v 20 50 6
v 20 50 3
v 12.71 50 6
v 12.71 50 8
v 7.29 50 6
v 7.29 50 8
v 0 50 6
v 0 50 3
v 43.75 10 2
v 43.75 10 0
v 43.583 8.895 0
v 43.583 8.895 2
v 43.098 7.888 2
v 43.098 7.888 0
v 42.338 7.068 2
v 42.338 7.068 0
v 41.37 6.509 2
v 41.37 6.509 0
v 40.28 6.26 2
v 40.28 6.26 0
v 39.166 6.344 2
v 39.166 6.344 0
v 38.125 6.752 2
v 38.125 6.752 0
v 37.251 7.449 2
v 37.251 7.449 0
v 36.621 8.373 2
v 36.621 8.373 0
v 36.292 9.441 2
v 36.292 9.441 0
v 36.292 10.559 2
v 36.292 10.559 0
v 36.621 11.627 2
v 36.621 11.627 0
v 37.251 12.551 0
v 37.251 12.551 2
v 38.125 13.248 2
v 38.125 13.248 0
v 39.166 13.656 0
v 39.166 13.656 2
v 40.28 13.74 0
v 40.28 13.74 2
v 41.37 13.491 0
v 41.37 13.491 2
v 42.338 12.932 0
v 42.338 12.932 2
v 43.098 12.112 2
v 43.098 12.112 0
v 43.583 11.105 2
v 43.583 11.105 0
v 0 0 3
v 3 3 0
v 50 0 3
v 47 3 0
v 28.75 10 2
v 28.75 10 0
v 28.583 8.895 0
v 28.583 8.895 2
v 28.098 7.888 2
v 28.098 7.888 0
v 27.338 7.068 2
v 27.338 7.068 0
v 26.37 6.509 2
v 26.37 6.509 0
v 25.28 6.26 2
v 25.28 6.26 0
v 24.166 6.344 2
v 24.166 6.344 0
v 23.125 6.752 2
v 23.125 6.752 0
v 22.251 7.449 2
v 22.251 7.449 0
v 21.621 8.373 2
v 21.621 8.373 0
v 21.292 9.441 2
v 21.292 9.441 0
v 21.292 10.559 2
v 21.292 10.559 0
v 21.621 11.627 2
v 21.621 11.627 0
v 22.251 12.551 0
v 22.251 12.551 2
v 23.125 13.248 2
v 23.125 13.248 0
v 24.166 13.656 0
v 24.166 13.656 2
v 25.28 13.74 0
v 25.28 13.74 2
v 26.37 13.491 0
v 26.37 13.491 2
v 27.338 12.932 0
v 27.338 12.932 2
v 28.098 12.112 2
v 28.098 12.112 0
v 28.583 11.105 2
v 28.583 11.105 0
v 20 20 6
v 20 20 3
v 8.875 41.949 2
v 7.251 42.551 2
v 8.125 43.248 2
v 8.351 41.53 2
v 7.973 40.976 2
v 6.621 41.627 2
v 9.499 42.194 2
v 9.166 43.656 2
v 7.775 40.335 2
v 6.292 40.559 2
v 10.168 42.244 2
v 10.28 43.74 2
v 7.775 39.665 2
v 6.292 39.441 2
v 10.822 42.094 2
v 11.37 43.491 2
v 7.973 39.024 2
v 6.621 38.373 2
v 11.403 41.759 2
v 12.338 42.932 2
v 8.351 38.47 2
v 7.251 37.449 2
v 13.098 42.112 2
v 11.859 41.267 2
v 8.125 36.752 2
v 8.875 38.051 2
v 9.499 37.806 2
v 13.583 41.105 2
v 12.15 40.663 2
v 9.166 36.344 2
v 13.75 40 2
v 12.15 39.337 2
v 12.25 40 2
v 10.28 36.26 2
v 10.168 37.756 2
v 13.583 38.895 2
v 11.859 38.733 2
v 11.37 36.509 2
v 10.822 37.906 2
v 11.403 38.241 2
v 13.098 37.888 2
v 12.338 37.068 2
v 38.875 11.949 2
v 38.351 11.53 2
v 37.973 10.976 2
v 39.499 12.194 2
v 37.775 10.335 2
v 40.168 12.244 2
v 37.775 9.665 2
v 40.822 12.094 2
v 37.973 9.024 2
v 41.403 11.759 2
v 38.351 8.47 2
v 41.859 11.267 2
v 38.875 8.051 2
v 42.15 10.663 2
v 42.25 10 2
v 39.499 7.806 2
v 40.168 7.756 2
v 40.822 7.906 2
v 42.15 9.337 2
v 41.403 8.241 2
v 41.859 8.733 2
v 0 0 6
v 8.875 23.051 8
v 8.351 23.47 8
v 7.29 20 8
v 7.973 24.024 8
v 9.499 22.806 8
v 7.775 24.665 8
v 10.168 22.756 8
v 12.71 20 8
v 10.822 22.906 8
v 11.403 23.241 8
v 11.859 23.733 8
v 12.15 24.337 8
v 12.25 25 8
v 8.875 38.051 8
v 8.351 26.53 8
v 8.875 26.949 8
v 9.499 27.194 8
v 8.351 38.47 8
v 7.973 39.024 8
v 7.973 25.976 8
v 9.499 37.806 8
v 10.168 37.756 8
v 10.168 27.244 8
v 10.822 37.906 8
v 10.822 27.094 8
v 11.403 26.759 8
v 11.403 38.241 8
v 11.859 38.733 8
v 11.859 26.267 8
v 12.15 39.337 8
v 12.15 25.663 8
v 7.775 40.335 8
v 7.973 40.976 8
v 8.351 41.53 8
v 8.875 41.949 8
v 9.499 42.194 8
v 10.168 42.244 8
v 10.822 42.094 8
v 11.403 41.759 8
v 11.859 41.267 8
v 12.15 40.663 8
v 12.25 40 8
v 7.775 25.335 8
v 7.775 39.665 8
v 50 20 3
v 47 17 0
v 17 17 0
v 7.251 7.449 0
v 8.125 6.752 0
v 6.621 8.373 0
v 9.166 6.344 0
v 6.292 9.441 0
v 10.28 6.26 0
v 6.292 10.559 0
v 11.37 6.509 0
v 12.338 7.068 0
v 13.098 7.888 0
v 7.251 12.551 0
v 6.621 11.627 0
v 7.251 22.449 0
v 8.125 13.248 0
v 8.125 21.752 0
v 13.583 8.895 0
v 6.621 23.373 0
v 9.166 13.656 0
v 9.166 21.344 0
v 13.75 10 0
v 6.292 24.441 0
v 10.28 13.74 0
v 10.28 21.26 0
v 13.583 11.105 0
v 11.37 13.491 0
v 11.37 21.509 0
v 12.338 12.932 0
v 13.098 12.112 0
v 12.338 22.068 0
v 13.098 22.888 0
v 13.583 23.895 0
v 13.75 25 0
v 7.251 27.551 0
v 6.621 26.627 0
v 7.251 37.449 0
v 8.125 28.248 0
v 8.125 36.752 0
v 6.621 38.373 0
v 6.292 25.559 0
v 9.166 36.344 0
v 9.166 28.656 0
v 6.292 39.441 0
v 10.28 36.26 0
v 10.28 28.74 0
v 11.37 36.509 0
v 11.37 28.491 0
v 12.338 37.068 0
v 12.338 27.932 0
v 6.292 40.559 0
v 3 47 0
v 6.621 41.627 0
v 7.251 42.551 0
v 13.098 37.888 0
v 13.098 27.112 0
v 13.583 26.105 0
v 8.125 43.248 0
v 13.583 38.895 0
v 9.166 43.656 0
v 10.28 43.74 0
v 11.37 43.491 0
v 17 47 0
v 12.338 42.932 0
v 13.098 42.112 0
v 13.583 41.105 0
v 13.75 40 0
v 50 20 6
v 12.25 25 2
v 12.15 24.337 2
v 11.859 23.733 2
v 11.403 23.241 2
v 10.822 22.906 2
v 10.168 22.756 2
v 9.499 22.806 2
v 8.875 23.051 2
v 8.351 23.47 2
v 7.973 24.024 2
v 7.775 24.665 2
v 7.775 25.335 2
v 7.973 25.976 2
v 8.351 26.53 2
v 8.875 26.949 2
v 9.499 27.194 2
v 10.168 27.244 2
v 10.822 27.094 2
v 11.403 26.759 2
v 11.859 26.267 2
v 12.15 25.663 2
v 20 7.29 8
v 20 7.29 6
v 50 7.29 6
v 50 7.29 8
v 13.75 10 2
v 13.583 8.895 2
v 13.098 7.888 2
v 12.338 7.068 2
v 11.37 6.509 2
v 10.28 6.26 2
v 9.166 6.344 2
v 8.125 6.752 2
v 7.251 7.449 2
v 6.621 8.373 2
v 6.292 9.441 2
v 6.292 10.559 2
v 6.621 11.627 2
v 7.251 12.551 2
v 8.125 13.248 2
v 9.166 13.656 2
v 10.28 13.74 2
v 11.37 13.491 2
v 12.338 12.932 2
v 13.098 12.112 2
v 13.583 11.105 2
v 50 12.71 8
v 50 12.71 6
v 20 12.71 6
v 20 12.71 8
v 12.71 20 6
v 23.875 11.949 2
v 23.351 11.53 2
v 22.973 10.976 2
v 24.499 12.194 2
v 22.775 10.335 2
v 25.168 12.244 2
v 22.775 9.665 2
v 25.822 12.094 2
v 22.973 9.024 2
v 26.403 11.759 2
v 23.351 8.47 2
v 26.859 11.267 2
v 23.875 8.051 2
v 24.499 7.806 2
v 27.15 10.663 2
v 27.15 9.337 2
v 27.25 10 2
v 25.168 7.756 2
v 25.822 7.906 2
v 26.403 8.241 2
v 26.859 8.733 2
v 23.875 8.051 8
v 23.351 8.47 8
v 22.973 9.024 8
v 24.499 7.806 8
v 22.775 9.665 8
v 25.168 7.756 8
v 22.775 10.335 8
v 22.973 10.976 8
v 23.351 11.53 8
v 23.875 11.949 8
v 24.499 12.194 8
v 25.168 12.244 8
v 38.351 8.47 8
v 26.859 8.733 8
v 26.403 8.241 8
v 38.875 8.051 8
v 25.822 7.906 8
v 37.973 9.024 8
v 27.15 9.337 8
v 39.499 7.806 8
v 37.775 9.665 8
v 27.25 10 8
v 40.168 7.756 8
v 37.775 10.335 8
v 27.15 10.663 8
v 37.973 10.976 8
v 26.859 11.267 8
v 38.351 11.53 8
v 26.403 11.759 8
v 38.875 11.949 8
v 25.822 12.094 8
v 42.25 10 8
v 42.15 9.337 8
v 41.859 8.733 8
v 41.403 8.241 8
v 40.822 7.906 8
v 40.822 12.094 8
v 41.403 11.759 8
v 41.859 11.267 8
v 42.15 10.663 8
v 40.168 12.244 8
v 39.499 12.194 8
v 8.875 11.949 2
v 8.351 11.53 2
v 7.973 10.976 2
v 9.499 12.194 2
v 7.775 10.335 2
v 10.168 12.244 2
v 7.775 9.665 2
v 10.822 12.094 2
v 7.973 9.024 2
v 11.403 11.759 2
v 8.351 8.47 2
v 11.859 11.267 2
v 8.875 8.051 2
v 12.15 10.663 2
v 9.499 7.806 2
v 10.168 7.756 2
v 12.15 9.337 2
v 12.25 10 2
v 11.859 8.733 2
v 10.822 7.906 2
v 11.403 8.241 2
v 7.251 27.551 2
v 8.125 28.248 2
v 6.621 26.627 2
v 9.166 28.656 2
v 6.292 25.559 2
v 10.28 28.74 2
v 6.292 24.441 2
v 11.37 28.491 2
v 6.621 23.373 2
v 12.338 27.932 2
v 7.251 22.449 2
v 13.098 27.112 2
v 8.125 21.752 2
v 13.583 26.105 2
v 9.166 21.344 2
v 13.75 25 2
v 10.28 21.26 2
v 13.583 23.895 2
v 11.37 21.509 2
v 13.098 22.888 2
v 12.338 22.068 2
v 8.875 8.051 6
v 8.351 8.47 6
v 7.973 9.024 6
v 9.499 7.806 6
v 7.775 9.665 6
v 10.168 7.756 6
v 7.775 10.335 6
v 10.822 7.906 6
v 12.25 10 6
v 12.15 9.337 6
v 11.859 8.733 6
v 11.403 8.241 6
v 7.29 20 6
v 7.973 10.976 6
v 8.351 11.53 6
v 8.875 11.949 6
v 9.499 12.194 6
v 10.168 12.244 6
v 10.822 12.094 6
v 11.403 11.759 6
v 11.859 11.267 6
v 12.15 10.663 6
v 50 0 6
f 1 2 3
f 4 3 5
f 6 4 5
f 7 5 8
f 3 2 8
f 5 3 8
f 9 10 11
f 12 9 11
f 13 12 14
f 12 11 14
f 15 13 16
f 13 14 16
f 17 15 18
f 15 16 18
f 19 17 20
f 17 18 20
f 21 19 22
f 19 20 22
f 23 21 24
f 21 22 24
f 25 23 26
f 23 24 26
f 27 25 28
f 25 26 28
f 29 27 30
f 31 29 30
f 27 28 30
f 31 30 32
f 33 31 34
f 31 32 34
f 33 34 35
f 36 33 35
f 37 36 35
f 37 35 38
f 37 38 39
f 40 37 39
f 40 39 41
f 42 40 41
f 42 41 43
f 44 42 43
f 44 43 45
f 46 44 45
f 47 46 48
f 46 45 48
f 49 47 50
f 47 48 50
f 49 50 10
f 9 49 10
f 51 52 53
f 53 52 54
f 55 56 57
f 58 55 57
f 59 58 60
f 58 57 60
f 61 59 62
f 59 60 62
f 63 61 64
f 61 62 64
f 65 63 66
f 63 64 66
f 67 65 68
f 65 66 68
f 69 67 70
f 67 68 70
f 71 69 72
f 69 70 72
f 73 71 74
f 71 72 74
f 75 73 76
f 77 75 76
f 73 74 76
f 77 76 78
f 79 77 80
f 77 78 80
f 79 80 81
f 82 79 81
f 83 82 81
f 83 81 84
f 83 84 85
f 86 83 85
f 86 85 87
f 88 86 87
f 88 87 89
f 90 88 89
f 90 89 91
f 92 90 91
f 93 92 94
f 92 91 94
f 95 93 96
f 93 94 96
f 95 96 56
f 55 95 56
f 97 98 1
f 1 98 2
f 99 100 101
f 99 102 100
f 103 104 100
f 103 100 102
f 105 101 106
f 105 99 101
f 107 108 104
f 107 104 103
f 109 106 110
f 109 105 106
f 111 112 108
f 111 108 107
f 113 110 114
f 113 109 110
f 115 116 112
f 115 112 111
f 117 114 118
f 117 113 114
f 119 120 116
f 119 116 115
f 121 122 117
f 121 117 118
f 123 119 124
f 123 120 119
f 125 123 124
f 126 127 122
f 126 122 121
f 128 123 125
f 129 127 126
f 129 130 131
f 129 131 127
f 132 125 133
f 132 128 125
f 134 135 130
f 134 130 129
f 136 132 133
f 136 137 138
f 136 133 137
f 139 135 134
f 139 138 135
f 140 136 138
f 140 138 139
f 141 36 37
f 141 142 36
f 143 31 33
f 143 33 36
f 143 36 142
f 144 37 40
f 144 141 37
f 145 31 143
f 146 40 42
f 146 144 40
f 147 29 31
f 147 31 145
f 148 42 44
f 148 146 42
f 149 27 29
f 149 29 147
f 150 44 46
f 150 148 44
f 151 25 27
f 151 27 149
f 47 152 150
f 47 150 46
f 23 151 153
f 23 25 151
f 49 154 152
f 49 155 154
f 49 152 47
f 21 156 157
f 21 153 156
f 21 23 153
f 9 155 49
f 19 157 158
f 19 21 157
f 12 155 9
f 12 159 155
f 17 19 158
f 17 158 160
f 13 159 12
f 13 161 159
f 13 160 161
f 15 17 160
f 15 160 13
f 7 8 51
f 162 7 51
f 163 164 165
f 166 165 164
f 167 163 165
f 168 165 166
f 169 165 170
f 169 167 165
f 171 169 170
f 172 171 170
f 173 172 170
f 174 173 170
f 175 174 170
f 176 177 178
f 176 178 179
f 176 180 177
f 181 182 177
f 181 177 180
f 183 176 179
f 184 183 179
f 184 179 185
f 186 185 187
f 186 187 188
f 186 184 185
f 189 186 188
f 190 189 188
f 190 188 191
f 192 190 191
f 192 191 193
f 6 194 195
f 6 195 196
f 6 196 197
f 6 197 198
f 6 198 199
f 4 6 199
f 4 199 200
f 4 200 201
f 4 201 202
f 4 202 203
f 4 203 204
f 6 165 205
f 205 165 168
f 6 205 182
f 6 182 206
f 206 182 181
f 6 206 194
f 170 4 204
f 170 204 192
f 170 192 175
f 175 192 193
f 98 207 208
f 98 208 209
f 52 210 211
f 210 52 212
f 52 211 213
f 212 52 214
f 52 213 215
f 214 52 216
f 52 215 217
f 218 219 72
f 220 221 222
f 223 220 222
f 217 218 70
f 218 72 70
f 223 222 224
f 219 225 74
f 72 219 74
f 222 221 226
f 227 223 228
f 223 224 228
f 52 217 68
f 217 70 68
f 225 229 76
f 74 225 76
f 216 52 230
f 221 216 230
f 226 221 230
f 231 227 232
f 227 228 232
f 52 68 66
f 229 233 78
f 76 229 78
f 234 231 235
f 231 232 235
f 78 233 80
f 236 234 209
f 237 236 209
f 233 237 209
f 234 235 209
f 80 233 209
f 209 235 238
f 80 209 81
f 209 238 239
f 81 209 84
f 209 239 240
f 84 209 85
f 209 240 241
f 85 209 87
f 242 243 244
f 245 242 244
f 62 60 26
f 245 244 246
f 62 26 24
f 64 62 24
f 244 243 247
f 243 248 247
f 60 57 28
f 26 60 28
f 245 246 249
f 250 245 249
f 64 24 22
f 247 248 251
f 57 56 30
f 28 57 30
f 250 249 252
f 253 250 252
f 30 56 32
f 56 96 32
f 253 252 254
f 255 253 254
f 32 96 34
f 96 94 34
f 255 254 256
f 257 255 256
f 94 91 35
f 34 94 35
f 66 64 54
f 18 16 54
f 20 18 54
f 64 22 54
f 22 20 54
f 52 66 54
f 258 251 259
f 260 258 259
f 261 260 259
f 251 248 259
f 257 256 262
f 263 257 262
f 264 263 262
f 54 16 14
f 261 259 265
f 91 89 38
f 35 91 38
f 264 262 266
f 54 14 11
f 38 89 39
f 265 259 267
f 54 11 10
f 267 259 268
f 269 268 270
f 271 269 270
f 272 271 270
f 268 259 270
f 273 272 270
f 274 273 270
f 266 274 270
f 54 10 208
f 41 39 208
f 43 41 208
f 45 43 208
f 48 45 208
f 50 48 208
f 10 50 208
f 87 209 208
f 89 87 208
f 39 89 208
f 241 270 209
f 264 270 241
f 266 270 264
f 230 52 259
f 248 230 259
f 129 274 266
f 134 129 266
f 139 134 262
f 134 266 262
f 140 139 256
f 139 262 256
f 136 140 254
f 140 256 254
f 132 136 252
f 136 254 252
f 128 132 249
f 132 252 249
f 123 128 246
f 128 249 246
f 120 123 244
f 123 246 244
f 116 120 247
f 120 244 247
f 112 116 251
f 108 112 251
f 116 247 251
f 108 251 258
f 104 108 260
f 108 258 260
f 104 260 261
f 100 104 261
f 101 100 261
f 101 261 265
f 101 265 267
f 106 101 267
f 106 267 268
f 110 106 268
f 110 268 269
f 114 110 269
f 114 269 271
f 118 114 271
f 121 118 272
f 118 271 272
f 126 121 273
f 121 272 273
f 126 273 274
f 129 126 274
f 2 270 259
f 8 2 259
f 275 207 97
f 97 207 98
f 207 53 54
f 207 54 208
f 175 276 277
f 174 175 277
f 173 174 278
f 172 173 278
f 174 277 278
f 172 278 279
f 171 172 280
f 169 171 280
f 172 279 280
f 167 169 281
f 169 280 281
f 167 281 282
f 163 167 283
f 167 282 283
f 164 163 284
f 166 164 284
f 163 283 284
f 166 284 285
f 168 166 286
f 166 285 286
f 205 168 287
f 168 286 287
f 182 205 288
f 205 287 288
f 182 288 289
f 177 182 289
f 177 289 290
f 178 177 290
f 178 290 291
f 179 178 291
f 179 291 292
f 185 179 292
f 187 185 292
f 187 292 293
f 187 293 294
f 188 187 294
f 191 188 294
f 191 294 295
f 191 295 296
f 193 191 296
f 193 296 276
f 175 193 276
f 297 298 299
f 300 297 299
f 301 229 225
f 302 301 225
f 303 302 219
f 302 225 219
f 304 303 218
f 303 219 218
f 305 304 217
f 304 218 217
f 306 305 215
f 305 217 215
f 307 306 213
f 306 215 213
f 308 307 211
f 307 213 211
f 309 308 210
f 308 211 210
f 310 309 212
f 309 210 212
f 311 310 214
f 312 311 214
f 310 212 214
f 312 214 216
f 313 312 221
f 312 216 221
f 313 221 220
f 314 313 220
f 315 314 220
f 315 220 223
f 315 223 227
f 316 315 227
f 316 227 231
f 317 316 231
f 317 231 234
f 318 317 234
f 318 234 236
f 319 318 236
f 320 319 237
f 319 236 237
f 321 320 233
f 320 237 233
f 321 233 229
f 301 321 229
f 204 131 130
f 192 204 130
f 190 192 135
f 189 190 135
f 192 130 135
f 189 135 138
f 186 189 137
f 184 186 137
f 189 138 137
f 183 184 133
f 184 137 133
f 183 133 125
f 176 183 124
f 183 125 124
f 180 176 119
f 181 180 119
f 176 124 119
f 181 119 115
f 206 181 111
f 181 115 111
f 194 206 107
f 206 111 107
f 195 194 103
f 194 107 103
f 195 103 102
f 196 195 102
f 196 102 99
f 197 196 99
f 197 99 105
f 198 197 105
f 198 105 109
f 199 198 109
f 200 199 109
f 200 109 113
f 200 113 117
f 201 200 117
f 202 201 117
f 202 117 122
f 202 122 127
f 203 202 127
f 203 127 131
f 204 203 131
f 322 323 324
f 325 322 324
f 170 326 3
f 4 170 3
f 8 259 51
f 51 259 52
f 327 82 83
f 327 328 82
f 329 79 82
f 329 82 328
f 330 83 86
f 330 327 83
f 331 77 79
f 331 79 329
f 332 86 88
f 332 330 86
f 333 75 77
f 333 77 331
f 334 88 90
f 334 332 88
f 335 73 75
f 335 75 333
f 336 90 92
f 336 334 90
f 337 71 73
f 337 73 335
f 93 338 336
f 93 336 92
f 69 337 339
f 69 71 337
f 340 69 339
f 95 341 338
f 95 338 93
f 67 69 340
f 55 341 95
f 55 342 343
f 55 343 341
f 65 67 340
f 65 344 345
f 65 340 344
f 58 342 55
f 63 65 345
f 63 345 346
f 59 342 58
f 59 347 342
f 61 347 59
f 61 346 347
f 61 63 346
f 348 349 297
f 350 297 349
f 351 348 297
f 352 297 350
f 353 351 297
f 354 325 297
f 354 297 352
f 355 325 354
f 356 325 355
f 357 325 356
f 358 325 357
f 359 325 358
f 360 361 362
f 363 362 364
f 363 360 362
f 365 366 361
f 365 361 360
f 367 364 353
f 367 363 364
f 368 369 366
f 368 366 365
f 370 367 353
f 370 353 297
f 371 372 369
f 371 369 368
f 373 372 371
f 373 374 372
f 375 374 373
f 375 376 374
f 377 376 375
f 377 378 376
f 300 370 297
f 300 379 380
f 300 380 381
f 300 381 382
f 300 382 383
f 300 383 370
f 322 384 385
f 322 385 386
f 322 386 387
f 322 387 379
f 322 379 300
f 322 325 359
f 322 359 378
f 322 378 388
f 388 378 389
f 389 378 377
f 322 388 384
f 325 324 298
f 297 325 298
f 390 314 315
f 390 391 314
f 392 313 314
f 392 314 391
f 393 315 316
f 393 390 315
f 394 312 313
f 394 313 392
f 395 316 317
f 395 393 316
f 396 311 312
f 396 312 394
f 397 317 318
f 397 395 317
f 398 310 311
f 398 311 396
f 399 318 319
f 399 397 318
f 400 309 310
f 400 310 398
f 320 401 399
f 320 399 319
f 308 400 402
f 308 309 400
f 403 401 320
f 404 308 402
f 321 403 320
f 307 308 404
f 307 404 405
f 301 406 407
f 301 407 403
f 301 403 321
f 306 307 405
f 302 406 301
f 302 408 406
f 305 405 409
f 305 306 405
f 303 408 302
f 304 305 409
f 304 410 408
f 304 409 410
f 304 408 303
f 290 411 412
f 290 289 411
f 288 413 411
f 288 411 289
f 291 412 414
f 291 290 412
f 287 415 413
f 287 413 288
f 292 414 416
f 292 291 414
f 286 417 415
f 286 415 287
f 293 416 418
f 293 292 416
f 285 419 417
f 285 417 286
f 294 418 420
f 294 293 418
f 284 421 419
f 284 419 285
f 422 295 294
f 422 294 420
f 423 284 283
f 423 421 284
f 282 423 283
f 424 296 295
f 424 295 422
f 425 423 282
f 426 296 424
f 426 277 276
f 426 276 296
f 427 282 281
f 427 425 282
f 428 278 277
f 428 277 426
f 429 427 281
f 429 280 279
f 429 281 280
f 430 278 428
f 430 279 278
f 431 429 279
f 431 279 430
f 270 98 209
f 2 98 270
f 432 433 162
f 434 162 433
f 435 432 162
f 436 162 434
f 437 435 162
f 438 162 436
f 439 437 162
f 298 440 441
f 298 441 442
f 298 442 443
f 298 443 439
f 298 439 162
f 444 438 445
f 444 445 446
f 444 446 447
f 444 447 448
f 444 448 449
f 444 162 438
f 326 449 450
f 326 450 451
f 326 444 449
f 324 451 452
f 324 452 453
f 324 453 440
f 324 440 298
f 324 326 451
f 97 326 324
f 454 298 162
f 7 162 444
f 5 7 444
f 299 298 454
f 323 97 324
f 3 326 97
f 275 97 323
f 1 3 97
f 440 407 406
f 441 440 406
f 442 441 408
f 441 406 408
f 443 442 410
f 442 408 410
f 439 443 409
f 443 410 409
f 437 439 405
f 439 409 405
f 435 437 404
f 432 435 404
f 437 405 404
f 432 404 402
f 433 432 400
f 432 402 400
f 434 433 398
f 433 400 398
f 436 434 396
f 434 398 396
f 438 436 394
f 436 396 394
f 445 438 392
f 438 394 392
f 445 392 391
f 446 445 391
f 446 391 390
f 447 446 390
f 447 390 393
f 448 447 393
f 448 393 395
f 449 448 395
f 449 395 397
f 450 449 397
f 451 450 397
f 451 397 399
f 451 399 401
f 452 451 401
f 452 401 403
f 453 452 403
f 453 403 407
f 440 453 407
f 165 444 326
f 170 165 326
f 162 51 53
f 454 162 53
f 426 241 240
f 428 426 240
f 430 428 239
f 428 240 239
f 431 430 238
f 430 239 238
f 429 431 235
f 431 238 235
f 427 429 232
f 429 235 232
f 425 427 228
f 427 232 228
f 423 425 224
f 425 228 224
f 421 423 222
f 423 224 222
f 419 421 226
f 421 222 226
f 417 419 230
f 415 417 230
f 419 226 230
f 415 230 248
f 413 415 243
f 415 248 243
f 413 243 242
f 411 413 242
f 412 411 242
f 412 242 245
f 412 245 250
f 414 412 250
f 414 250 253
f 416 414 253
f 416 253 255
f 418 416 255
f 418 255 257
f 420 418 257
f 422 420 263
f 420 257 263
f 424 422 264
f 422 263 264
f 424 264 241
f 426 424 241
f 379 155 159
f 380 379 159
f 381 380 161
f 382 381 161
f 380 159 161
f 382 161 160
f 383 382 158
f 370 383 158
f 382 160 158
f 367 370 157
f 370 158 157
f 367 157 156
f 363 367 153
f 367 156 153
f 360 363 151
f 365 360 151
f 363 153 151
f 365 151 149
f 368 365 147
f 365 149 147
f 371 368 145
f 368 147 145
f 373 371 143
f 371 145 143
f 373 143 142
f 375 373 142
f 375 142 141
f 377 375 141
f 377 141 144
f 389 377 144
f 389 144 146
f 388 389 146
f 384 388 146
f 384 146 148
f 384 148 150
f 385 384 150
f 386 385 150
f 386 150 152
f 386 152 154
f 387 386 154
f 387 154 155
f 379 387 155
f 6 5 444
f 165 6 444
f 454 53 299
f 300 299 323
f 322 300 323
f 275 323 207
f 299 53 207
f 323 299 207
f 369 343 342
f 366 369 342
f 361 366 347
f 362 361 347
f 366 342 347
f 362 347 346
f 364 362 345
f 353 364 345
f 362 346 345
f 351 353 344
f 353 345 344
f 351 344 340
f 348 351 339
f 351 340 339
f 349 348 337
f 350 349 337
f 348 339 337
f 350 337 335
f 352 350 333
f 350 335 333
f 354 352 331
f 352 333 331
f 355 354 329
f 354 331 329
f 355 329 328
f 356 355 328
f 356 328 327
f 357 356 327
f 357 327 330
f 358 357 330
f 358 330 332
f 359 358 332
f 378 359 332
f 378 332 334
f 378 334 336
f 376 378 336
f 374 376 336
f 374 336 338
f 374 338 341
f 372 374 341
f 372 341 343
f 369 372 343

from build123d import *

# Parameters (mm, degrees)
F1_DEPTH = 6
F3_DEPTH = 2
F4_R     = 2.25
F5_DEPTH = 8.001
F6_R     = 3.75
F7_DEPTH = 2
F8_SIZE  = 3


with BuildPart() as f1:
    # F0 (on Top) → F1 (new body)
    with BuildSketch(Plane.XY):
        Polygon((0, 50), (0, 0), (50, 0), (50, 20), (20, 20), (20, 50), align=None)
    extrude(amount=F1_DEPTH)

    # F2 (on face) → F3 (join)
    with BuildSketch(Plane.XY.offset(6)):
        Polygon((12.71, 50), (7.29, 50), (7.29, 20), (10, 20), (12.71, 20), align=None)
        Polygon((50, 7.29), (50, 12.71), (20, 12.71), (20, 10), (20, 7.29), align=None)
    extrude(amount=F3_DEPTH)

    # F4 (on face) → F5 (cut, through all)
    with BuildSketch(Plane(origin=(0, 0, 0), x_dir=(1, 0, 0), z_dir=(0, 0, -1))):
        with Locations((10, -10)):
            Circle(F4_R)
        with Locations((40, -10)):
            Circle(F4_R)
        with Locations((10, -40)):
            Circle(F4_R)
        with Locations((25, -10)):
            Circle(F4_R)
        with Locations((10, -25)):
            Circle(F4_R)
    extrude(amount=-F5_DEPTH, mode=Mode.SUBTRACT)

    # F6 (on face) → F7 (cut)
    with BuildSketch(Plane(origin=(0, 0, 0), x_dir=(1, 0, 0), z_dir=(0, 0, -1))):
        with Locations((10, -10)):
            Circle(F6_R)
        with Locations((25, -10)):
            Circle(F6_R)
        with Locations((40, -10)):
            Circle(F6_R)
        with Locations((10, -25)):
            Circle(F6_R)
        with Locations((10, -40)):
            Circle(F6_R)
    extrude(amount=-F7_DEPTH, mode=Mode.SUBTRACT)

    # F8
    f8_edges = [f1.edges().sort_by_distance(p)[0] for p in [
        (25, 0, 0),
        (0, 25, 0),
        (20, 35, 0),
        (35, 20, 0),
        (50, 10, 0),
        (10, 50, 0),
    ]]
    chamfer(f8_edges, length=F8_SIZE)


solid = f1.part
